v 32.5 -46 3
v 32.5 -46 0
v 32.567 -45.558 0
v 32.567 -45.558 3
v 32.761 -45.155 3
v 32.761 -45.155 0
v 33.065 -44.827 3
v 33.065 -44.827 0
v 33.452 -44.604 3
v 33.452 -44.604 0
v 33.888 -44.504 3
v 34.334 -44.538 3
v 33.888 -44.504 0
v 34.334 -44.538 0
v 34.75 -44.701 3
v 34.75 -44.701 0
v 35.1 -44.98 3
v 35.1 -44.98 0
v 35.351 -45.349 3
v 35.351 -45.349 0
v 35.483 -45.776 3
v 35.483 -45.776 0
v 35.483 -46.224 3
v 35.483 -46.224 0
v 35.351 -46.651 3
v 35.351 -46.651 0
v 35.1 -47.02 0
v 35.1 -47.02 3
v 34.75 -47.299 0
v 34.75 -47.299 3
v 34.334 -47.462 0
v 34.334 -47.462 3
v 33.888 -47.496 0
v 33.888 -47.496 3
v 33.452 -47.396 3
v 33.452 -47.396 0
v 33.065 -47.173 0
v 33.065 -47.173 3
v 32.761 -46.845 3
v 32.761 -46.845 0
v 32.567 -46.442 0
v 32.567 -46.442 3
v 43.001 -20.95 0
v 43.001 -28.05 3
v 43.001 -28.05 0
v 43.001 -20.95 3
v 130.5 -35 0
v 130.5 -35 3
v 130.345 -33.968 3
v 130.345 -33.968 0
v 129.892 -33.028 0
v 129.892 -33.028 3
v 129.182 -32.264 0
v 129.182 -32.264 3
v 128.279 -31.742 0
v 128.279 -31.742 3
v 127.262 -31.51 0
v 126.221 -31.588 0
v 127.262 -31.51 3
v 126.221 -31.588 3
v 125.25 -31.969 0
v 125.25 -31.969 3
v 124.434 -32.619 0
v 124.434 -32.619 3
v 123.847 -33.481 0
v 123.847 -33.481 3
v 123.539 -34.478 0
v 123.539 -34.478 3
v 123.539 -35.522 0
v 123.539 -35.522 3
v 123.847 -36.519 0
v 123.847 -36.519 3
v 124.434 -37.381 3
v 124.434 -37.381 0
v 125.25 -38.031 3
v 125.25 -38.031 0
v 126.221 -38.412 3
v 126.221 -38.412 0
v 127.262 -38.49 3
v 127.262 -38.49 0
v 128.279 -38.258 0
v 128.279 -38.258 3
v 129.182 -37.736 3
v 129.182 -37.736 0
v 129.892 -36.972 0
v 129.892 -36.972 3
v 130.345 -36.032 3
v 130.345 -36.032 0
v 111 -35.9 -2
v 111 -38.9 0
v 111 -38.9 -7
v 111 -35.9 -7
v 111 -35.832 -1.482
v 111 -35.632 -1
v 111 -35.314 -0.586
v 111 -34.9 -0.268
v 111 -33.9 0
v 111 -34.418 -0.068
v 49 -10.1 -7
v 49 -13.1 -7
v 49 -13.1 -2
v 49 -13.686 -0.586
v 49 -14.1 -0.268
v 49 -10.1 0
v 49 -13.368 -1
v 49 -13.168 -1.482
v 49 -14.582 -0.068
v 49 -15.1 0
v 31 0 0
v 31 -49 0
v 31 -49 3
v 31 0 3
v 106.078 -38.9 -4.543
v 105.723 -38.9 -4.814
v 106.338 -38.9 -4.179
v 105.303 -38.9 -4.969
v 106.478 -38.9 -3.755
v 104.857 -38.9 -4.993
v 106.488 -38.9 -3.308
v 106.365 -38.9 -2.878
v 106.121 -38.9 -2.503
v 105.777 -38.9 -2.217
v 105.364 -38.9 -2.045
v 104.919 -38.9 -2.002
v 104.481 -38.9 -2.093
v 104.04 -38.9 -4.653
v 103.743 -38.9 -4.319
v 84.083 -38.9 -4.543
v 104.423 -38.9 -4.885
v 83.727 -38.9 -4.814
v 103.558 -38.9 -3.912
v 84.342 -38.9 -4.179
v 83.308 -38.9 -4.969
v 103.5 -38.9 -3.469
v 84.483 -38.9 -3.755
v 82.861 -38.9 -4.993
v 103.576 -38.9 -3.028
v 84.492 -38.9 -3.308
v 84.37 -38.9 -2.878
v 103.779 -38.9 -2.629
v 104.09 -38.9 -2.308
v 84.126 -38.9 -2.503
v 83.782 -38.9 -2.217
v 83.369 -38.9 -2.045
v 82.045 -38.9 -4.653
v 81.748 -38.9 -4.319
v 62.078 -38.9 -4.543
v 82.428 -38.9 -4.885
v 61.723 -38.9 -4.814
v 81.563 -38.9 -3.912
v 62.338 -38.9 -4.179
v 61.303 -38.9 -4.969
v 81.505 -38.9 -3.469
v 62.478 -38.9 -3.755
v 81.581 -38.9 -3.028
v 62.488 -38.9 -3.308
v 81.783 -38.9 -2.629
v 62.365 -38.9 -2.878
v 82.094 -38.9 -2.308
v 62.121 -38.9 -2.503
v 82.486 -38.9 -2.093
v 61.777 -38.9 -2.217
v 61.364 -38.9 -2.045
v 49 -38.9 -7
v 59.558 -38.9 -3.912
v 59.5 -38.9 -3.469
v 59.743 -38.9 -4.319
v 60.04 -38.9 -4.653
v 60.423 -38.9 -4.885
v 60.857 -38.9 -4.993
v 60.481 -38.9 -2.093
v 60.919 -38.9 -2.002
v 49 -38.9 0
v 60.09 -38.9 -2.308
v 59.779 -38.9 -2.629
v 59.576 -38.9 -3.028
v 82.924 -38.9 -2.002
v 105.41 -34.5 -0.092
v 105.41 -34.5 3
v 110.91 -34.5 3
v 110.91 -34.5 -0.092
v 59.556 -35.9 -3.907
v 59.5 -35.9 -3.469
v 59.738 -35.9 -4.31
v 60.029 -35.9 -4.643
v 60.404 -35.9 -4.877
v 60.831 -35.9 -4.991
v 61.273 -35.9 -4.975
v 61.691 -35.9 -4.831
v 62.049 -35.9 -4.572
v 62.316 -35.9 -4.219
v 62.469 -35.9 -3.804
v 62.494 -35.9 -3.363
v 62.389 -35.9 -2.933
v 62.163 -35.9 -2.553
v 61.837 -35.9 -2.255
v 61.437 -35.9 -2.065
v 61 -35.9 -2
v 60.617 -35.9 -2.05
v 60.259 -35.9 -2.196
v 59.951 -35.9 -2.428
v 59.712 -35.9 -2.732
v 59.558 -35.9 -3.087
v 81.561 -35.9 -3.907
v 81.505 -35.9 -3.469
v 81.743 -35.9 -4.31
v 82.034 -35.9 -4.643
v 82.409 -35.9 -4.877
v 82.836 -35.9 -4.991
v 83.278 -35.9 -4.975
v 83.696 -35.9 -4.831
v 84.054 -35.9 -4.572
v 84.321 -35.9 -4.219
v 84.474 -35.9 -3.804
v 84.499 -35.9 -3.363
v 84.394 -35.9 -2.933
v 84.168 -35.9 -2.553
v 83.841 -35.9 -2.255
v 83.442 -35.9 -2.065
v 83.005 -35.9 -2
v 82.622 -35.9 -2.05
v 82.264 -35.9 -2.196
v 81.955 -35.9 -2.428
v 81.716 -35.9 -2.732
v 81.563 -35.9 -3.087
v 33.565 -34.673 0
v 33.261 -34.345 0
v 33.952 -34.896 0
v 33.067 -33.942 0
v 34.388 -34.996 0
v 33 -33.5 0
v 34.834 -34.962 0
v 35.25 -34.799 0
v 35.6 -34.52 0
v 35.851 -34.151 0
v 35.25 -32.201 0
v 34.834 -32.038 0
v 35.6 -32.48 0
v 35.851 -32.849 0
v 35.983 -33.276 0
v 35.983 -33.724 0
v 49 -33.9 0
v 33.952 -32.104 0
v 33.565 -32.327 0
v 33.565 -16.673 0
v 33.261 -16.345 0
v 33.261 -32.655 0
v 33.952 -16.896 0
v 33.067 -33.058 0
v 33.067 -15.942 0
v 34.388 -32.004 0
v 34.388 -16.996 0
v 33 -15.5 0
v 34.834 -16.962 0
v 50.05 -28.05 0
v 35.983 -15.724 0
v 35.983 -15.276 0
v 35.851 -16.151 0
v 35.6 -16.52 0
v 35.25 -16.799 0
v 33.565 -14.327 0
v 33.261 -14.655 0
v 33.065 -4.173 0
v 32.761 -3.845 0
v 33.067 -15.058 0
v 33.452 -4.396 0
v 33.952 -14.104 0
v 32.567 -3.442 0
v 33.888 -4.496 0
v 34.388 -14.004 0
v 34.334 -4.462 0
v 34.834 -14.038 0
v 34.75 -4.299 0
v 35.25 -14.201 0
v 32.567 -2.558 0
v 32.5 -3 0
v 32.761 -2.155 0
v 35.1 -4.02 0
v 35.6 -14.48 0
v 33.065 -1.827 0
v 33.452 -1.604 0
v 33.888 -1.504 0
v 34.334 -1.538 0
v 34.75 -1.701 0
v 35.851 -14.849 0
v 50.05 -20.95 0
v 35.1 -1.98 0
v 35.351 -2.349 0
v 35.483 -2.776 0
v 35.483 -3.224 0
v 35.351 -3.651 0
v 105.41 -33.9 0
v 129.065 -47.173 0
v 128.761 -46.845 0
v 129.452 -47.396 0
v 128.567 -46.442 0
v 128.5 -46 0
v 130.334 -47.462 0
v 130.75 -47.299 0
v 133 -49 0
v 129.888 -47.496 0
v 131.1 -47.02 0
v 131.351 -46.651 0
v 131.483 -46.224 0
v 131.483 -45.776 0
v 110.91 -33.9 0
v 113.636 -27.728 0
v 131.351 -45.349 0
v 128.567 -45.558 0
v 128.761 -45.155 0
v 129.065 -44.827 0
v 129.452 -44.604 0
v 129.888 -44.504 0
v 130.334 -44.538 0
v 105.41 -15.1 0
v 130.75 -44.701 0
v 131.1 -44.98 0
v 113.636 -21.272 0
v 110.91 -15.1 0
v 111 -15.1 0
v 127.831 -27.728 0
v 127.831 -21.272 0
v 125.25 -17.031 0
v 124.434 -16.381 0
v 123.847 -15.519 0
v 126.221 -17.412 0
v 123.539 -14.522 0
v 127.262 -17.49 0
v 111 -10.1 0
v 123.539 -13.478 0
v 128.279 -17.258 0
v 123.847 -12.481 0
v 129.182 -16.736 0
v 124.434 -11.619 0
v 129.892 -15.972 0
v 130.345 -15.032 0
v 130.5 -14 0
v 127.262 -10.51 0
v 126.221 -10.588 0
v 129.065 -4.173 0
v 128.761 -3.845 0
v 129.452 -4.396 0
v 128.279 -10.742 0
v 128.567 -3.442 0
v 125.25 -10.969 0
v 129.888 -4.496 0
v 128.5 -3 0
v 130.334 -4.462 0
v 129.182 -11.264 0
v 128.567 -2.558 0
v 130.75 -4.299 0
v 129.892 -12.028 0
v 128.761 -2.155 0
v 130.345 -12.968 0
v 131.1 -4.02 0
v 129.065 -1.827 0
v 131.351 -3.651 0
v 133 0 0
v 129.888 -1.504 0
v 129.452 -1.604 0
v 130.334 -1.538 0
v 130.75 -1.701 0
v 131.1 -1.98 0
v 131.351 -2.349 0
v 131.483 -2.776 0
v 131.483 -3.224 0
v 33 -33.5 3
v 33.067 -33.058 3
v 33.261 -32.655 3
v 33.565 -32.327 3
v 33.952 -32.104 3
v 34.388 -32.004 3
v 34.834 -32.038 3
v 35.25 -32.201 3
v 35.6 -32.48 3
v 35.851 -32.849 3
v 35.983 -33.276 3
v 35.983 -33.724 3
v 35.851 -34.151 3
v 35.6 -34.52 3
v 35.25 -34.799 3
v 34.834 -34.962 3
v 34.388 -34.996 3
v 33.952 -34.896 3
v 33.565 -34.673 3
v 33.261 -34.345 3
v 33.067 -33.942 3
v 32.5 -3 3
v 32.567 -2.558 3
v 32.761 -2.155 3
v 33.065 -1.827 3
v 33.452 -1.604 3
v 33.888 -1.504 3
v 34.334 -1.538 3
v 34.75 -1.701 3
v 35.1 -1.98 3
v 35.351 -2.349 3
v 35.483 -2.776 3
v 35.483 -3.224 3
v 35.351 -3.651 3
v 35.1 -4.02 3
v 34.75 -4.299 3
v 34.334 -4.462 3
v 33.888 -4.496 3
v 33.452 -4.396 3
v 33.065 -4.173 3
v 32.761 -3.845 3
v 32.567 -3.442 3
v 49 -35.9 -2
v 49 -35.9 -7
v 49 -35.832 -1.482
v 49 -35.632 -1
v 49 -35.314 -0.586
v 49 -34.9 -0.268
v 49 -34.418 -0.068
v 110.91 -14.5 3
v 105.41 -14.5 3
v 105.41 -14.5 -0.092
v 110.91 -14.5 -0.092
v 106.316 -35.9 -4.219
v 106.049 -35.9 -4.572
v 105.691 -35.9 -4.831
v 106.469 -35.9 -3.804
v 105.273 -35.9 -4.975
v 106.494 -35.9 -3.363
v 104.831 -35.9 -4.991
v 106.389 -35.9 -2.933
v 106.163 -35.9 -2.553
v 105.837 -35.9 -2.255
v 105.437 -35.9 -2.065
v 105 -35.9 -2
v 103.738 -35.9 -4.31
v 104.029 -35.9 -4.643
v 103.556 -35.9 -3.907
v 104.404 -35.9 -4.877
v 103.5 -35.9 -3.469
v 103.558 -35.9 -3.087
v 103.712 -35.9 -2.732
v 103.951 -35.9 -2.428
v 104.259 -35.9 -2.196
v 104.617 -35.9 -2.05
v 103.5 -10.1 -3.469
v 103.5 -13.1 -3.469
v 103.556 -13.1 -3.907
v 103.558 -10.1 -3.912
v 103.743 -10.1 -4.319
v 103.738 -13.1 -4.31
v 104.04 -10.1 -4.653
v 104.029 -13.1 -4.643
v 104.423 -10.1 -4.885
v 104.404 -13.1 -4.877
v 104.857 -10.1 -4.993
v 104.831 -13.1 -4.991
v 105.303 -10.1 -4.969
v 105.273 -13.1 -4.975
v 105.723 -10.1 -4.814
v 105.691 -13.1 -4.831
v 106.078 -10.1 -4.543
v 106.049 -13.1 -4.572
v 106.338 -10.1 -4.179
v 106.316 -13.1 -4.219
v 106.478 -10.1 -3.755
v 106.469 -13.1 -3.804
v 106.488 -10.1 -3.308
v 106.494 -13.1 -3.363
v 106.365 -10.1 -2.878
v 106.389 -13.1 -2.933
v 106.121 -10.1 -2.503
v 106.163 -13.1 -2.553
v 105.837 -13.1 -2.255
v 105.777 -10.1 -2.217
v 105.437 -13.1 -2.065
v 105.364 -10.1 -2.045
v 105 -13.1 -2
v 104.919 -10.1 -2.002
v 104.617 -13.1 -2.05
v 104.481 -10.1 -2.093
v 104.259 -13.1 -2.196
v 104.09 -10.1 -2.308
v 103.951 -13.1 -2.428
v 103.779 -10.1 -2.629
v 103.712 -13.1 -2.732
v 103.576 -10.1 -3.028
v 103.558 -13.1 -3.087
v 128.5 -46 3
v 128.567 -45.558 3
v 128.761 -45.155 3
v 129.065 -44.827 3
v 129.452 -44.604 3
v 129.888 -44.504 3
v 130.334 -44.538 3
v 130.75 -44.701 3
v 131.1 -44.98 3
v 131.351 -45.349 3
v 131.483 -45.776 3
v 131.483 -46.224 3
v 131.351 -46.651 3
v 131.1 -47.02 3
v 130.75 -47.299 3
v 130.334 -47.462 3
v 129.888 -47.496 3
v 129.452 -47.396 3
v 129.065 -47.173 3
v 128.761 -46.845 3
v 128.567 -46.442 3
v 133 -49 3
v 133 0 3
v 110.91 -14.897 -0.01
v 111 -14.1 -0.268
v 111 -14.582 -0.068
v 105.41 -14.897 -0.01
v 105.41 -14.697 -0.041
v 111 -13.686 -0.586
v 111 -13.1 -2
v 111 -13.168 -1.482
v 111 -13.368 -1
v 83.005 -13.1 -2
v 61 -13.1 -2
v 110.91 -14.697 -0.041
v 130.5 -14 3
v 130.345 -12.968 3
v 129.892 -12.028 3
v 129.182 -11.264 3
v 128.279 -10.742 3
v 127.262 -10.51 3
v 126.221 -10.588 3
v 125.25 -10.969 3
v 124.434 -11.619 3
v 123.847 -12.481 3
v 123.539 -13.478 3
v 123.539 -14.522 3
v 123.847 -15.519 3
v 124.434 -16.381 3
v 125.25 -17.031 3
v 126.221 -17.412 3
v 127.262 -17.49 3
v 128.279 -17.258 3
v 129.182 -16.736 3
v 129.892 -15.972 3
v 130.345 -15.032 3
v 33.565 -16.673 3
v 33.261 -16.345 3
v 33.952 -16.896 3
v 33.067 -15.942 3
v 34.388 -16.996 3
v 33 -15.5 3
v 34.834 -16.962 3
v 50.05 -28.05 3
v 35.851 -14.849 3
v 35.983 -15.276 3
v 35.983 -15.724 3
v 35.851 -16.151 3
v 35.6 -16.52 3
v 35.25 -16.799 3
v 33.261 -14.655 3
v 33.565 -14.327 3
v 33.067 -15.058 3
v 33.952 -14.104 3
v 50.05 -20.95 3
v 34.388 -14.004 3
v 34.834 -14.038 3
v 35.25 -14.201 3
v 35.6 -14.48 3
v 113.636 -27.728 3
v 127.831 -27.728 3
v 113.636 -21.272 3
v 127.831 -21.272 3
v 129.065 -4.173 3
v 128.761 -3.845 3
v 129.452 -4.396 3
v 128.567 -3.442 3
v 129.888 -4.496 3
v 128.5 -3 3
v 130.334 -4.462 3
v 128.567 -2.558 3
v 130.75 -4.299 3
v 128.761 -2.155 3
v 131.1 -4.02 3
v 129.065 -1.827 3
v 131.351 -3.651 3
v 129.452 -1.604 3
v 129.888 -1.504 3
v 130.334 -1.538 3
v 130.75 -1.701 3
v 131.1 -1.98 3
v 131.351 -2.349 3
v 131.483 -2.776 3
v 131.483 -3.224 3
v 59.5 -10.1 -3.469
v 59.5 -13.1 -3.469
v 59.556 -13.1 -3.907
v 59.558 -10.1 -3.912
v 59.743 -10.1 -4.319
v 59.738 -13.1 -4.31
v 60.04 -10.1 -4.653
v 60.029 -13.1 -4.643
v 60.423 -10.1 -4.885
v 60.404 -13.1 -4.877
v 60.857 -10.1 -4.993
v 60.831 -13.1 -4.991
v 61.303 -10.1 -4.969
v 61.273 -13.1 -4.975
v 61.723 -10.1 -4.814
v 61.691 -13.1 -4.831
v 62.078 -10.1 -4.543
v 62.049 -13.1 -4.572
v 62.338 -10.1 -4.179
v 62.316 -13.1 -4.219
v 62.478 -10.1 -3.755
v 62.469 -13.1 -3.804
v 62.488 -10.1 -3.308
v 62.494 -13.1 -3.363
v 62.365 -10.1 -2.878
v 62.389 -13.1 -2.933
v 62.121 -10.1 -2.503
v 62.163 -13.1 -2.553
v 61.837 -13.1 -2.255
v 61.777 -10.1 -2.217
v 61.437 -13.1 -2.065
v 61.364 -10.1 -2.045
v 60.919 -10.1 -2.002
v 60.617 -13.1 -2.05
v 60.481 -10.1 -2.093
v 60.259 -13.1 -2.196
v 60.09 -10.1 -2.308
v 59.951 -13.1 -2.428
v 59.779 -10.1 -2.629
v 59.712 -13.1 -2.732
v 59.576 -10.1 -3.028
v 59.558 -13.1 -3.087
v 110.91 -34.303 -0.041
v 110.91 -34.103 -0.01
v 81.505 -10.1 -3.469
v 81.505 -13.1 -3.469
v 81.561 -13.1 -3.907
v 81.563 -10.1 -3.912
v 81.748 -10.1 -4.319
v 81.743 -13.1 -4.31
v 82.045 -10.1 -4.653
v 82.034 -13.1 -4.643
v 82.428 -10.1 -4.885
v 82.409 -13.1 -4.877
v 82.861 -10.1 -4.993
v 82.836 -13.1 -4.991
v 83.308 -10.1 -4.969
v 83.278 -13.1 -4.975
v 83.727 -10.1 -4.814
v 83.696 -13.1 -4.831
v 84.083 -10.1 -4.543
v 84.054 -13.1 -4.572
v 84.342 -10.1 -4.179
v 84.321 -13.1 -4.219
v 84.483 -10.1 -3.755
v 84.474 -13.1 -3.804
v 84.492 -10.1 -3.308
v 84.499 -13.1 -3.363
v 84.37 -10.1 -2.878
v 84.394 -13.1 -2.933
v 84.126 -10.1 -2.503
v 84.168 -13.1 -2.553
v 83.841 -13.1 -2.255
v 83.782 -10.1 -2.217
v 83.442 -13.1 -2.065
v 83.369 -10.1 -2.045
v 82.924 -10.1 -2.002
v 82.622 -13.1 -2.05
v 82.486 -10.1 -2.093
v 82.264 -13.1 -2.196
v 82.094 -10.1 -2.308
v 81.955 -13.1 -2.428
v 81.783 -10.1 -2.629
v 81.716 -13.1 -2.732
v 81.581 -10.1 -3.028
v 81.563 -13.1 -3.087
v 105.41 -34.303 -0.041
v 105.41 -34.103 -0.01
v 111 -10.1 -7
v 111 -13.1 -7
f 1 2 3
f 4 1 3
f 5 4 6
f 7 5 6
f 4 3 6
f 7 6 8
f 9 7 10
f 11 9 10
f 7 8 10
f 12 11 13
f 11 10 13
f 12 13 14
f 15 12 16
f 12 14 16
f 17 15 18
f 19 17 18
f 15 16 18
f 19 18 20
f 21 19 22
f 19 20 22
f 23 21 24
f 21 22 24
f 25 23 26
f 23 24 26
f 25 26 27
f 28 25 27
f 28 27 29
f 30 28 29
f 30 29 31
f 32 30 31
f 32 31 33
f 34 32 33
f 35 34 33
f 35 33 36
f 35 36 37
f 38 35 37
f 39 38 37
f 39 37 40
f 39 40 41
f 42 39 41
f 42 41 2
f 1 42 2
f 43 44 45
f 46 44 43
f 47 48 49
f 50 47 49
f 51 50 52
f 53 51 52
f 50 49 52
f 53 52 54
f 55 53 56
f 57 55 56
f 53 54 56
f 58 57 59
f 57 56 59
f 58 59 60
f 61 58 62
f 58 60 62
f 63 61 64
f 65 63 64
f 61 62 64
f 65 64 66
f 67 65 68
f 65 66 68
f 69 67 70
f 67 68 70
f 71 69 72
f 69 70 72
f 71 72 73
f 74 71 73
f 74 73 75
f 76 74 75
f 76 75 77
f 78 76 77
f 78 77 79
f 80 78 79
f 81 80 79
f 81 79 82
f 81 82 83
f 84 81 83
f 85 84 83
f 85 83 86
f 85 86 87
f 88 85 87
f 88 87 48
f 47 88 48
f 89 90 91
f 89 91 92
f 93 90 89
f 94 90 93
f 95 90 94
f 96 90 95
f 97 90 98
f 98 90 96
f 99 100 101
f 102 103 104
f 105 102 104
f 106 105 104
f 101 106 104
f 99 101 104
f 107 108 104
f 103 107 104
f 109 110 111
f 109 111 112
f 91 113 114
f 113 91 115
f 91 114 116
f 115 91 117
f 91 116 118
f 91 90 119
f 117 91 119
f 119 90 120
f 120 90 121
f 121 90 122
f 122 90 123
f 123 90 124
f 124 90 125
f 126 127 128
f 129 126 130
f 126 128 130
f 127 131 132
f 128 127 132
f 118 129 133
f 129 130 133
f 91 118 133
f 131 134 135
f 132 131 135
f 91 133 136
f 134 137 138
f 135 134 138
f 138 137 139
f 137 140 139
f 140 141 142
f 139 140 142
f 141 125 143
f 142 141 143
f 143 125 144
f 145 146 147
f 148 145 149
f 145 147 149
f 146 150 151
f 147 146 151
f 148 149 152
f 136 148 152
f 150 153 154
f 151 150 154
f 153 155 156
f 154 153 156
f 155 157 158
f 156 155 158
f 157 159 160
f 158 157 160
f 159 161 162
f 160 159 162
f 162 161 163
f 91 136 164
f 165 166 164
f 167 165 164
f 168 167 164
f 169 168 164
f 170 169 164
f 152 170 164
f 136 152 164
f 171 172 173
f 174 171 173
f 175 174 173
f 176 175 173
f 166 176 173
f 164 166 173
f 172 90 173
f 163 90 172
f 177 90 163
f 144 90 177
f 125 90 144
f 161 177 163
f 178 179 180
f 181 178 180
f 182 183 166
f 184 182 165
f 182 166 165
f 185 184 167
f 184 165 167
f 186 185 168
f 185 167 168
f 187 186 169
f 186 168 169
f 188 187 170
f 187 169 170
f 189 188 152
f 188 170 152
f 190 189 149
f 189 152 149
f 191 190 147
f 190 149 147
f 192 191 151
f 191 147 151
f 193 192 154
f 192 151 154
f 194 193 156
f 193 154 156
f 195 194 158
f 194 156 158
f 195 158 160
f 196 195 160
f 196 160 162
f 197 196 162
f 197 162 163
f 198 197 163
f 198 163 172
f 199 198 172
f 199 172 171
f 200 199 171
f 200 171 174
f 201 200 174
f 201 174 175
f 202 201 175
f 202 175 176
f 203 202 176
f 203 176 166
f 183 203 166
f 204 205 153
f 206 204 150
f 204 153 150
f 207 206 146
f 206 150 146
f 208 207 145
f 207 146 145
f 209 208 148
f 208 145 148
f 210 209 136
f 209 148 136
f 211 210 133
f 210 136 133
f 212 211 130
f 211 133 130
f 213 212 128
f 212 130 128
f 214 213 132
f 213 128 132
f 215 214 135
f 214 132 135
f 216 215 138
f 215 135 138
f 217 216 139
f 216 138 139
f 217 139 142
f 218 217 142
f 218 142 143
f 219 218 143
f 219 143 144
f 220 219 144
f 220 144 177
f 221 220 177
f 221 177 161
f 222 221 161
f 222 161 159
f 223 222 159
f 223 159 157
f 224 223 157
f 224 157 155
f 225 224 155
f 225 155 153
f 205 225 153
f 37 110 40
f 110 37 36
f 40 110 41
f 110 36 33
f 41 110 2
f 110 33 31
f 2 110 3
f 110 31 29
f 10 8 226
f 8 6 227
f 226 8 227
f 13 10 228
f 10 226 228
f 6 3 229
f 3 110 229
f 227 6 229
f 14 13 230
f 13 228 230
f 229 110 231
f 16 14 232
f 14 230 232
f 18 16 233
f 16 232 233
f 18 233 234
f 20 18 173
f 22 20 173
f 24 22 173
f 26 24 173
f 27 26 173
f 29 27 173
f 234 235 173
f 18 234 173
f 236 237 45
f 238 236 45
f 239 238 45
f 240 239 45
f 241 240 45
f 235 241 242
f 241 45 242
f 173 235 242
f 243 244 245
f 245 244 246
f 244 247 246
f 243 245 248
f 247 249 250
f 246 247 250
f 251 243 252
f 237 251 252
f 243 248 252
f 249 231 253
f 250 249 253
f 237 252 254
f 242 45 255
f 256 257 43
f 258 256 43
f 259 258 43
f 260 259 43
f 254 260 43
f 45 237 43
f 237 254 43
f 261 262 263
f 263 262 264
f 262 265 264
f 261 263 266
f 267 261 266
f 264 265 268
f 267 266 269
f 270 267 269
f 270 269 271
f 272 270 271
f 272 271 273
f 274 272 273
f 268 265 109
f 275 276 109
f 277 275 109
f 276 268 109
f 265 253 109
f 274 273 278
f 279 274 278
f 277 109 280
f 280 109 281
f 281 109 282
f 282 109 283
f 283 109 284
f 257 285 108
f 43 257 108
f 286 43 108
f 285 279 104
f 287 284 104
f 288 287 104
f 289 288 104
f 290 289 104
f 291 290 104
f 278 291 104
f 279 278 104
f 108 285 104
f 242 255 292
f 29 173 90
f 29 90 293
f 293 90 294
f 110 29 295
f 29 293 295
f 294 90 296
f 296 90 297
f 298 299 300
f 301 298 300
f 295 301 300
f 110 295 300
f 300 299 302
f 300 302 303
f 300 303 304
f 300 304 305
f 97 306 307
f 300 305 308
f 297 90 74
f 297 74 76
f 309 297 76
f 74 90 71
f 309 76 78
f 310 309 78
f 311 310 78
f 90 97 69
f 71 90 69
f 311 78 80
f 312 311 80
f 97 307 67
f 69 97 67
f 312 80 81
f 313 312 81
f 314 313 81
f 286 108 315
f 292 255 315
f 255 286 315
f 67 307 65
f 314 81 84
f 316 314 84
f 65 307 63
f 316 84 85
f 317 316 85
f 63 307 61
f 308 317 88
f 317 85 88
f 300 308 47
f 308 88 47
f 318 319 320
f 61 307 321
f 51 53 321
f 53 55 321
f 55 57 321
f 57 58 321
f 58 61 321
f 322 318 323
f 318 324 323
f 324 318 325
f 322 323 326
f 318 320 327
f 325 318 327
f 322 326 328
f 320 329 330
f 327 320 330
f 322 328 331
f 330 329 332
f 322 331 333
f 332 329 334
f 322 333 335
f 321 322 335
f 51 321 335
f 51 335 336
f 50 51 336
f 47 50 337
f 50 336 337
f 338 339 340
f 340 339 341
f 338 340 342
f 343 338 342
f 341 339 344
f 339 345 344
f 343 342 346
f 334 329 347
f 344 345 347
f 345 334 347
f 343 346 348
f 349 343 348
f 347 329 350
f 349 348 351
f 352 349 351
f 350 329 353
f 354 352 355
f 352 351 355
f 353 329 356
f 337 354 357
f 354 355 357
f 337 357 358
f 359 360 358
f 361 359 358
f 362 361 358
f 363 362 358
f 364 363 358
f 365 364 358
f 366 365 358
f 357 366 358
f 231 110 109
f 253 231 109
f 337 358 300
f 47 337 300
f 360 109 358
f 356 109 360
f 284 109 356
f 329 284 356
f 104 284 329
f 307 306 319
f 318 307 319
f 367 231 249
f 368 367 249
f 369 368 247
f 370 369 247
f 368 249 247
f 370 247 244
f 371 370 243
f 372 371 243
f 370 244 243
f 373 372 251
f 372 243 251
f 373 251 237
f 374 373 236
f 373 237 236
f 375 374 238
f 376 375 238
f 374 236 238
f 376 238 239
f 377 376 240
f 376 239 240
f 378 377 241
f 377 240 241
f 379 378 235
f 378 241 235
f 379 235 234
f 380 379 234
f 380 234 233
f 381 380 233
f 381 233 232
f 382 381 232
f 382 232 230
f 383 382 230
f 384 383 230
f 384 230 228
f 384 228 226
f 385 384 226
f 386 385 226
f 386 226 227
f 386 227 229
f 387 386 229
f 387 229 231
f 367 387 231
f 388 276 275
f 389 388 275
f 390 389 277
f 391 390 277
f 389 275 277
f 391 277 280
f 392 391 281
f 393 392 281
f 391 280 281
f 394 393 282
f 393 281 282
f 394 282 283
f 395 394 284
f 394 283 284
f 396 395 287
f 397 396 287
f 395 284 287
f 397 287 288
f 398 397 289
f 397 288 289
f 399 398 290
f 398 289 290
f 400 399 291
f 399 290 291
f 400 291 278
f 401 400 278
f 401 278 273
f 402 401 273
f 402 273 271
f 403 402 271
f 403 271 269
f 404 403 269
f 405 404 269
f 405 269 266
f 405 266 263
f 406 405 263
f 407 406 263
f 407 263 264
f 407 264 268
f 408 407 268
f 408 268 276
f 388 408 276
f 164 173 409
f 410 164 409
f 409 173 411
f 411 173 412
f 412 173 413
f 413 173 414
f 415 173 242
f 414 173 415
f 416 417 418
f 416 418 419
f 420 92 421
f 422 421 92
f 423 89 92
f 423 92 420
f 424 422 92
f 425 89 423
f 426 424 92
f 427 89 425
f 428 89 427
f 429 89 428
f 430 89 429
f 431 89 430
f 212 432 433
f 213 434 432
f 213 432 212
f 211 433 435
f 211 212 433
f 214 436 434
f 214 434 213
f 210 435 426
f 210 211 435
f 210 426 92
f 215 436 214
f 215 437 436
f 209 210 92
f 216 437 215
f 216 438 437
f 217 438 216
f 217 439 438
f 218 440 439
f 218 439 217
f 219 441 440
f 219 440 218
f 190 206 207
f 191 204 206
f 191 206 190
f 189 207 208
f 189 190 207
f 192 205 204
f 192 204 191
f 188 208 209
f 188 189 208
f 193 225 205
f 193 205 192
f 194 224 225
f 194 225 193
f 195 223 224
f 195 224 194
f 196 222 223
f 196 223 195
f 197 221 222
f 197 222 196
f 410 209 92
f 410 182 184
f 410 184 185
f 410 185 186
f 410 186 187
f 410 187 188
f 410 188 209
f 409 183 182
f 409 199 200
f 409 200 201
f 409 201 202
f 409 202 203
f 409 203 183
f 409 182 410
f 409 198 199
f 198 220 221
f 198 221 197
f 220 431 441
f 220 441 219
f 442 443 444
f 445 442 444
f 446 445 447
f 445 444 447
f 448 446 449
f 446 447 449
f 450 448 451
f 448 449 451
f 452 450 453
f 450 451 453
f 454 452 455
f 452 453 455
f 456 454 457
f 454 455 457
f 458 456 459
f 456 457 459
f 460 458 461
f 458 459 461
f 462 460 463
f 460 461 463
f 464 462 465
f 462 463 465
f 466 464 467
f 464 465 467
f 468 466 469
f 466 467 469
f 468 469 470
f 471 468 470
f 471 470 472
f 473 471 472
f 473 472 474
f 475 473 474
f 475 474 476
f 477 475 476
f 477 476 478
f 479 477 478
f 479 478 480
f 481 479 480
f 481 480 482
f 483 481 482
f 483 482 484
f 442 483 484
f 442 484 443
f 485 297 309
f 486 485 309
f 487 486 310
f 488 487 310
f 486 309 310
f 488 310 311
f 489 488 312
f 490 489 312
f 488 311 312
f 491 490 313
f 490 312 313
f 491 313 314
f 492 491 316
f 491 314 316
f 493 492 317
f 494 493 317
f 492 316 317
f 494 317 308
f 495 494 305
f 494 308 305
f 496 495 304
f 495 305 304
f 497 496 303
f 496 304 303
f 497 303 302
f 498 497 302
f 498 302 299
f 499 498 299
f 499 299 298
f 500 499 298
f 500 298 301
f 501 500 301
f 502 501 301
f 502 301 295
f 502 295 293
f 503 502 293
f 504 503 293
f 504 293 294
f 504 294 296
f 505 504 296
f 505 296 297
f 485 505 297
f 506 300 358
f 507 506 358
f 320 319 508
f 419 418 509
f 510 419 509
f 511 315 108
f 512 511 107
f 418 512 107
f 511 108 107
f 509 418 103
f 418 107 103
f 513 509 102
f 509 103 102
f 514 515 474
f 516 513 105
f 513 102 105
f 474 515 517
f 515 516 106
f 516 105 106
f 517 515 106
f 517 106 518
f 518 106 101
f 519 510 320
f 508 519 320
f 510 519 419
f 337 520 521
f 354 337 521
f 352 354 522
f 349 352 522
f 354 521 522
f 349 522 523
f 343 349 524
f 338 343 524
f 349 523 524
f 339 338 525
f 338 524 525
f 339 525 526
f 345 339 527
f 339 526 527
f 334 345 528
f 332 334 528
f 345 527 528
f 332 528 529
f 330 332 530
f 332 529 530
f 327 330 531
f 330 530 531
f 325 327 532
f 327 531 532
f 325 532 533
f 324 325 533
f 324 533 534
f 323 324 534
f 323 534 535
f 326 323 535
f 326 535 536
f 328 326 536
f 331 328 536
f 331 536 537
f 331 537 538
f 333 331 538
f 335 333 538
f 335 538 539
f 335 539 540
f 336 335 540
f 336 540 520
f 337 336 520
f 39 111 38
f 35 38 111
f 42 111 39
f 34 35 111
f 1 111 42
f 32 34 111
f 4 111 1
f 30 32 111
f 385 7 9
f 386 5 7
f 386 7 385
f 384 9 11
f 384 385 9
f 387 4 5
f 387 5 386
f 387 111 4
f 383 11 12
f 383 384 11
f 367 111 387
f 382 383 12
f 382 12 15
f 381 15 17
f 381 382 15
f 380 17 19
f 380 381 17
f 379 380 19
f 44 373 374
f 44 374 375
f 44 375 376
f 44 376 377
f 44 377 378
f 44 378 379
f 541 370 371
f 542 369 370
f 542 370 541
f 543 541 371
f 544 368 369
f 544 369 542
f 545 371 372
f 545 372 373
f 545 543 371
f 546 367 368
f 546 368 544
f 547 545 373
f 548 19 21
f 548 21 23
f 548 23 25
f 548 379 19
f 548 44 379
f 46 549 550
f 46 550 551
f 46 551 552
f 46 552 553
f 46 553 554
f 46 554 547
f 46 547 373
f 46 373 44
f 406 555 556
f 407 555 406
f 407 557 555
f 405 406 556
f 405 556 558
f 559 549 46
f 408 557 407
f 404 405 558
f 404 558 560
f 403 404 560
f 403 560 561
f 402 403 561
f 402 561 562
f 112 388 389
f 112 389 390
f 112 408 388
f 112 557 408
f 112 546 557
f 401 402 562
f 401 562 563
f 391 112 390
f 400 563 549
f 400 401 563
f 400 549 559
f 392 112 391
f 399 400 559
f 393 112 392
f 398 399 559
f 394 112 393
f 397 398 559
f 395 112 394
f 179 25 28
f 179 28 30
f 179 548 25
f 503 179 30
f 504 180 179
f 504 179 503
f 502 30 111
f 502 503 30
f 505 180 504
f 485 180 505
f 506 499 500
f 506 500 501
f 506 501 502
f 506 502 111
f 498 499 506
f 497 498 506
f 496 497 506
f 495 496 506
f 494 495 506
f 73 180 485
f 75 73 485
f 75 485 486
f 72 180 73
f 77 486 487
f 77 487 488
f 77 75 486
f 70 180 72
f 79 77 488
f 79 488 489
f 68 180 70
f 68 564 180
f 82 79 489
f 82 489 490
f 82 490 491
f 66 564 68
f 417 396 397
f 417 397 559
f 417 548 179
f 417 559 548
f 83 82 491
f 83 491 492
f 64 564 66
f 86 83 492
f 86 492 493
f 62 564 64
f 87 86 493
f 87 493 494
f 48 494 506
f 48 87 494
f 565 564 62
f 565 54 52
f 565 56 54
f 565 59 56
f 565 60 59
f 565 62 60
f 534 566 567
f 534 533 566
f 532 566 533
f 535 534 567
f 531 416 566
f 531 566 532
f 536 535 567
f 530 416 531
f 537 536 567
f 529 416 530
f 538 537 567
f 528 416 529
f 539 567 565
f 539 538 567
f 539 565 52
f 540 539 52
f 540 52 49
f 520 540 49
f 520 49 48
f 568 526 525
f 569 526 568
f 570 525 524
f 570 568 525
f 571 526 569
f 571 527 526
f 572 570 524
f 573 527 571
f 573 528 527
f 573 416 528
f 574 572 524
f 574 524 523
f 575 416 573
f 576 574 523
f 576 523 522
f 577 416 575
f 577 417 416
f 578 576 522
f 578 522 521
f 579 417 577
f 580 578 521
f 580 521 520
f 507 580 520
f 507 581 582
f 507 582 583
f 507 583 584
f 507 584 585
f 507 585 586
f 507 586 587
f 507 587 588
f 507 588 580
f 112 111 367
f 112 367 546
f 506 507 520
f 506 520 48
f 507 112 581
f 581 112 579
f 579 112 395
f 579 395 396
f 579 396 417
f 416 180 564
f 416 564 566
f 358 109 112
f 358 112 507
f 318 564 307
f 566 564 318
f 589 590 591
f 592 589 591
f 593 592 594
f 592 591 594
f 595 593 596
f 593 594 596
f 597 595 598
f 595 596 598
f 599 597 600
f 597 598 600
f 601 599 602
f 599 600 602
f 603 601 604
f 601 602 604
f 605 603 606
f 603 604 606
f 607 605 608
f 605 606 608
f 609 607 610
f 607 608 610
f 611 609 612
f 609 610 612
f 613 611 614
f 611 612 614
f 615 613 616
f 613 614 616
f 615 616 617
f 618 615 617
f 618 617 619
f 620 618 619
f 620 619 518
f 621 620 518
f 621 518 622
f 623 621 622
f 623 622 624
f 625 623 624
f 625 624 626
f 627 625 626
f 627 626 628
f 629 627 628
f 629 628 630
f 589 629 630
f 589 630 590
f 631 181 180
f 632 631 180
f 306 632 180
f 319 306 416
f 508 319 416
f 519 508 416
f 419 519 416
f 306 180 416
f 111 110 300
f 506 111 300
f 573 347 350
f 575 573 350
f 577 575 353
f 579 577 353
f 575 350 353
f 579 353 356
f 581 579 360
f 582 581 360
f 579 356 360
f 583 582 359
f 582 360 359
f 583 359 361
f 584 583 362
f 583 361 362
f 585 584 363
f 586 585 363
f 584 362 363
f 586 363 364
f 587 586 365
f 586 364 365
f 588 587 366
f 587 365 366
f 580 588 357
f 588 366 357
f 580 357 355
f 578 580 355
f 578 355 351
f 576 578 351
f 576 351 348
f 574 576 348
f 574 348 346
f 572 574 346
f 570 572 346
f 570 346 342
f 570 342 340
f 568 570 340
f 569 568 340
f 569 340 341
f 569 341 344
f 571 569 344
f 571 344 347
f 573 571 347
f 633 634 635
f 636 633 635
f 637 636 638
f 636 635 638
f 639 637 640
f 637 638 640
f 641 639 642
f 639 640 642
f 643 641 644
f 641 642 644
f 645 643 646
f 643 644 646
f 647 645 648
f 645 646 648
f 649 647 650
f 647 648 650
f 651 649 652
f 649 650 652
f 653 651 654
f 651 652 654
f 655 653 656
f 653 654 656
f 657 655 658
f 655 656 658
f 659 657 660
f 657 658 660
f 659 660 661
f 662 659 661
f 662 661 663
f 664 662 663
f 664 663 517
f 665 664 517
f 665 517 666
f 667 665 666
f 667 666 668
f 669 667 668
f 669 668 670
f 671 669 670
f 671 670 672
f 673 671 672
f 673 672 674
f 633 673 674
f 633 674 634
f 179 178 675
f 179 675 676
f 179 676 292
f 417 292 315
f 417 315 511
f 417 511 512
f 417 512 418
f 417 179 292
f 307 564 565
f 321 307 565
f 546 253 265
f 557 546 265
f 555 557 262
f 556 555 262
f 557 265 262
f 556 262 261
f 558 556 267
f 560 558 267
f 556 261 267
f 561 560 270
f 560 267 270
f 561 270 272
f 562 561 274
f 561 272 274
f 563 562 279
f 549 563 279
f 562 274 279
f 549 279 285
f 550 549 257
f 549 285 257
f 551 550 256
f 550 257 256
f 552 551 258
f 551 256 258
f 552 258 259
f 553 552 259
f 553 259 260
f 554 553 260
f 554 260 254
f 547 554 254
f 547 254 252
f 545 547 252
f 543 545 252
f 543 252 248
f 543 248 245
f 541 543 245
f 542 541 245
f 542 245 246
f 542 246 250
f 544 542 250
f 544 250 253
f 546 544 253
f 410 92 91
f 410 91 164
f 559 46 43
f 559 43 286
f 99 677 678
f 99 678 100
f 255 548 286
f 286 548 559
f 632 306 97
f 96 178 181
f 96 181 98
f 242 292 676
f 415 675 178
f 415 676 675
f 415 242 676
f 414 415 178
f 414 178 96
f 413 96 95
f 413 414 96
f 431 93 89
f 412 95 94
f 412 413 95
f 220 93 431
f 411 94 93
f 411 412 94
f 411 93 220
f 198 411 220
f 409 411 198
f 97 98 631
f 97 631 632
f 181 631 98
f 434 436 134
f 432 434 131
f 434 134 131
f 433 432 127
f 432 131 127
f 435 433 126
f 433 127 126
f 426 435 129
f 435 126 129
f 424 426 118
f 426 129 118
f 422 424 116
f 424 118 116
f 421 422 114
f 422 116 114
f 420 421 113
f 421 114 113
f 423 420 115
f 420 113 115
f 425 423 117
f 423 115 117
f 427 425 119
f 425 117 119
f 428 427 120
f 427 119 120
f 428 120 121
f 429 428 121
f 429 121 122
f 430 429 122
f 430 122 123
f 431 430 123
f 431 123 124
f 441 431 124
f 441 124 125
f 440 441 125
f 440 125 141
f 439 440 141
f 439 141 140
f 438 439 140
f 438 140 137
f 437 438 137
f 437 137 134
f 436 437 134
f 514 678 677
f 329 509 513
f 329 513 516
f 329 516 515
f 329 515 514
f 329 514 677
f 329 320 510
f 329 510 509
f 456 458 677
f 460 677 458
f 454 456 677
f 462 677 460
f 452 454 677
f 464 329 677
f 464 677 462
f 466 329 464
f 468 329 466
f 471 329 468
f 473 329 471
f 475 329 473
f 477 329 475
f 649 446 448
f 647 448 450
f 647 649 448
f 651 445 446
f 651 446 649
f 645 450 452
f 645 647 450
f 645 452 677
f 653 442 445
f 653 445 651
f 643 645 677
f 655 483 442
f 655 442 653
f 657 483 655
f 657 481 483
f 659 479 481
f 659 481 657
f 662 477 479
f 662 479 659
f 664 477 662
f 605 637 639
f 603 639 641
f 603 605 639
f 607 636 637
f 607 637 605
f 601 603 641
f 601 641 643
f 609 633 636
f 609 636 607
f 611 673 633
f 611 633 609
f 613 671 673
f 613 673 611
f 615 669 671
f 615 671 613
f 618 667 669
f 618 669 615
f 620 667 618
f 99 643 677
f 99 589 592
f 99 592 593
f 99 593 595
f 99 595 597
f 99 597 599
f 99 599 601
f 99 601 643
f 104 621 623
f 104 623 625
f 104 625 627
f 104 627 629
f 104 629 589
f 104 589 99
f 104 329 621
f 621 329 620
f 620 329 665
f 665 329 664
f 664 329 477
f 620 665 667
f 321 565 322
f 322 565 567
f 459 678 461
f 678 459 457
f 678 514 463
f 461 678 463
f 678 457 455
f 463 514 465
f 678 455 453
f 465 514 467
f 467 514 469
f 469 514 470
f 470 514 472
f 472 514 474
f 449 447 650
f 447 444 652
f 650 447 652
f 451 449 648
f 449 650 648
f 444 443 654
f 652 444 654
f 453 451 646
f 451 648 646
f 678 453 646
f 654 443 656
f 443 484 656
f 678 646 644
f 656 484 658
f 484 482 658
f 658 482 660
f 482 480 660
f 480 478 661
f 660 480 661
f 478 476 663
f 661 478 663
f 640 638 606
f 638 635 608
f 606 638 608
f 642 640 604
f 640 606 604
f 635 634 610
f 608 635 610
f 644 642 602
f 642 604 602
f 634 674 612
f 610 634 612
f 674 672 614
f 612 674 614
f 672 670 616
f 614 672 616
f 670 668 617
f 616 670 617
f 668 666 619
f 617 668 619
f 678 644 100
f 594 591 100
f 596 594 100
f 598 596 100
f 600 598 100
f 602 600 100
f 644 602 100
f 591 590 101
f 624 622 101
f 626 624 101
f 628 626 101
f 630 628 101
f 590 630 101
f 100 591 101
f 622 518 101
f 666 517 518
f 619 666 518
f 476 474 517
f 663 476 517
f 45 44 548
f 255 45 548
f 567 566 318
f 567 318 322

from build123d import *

# Parameters (mm, degrees)
SKETCH_1_W          = 102
SKETCH_1_H          = 49
EXTRUDE_1_DEPTH     = 3
SKETCH_2_R          = 1.5
CUT_EXTRUDE_1_DEPTH = 4
SKETCH_3_W          = 62
SKETCH_3_H          = 3
EXTRUDE_2_DEPTH     = 7
FILLET_1_R          = 2
FILLET_2_R          = 2
MM_PRESS_1_D        = 3
SKETCH_6_R          = 3.5
SKETCH_6_W          = 5.5
SKETCH_6_H          = 20
SKETCH_6_W_2        = 7.049620939
SKETCH_6_H_2        = 7.099016596
SKETCH_6_W_3        = 14.194500079
SKETCH_6_H_3        = 6.456669412
CUT_EXTRUDE_2_DEPTH = 7


with BuildPart() as part:
    # 草图1 → 凸台-拉伸1 (new body)
    with BuildSketch(Plane.XY):
        with Locations((82, -24.5)):
            Rectangle(SKETCH_1_W, SKETCH_1_H)
    extrude(amount=EXTRUDE_1_DEPTH)

    # 草图2 → 切除-拉伸1 (cut, through all)
    with BuildSketch(Plane(origin=(0, 0, 0), x_dir=(-1, 0, 0), z_dir=(0, 0, -1))):
        with Locations((-130, -46)):
            Circle(SKETCH_2_R)
        with Locations((-130, -3)):
            Circle(SKETCH_2_R)
        with Locations((-34, -3)):
            Circle(SKETCH_2_R)
        with Locations((-34.5, -15.5)):
            Circle(SKETCH_2_R)
        with Locations((-34, -46)):
            Circle(SKETCH_2_R)
        with Locations((-34.5, -33.5)):
            Circle(SKETCH_2_R)
    extrude(amount=-CUT_EXTRUDE_1_DEPTH, mode=Mode.SUBTRACT)

    # 草图3 → 凸台-拉伸2 (add)
    with BuildSketch(Plane(origin=(0, 0, 0), x_dir=(-1, 0, 0), z_dir=(0, 0, -1))):
        with Locations((-80, -11.6)):
            Rectangle(SKETCH_3_W, SKETCH_3_H)
        with Locations((-80, -37.4)):
            Rectangle(SKETCH_3_W, SKETCH_3_H)
    extrude(amount=EXTRUDE_2_DEPTH)

    # 圆角1
    fillet_1_edges = [part.edges().sort_by_distance(p)[0] for p in [
        (80, -13.1, 0),
    ]]
    fillet(fillet_1_edges, radius=FILLET_1_R)

    # 圆角2
    fillet_2_edges = [part.edges().sort_by_distance(p)[0] for p in [
        (80, -35.9, 0),
    ]]
    fillet(fillet_2_edges, radius=FILLET_2_R)

    # 大小mm Press 暗销孔1 (through all)
    with Locations(Plane(origin=(43.000752307, -10.1, 120.302802184), x_dir=(0.99978014, 0, -0.020968354), z_dir=(0, 1, 0))):
        with Locations((20.591231353, 123.39816829), (42.591231353, 122.936763059), (64.581557509, 122.475560716)):
            Hole(MM_PRESS_1_D / 2)

    # 草图6 → 切除-拉伸2 (cut)
    with BuildSketch(Plane.XY.offset(3)):
        with Locations((127, -14)):
            Circle(SKETCH_6_R)
        with Locations((127, -35)):
            Circle(SKETCH_6_R)
        with Locations((108.159552583, -24.5)):
            Rectangle(SKETCH_6_W, SKETCH_6_H)
        with Locations((46.525562777, -24.5)):
            Rectangle(SKETCH_6_W_2, SKETCH_6_H_2)
        with Locations((120.733739183, -24.5)):
            Rectangle(SKETCH_6_W_3, SKETCH_6_H_3)
    extrude(amount=-CUT_EXTRUDE_2_DEPTH, mode=Mode.SUBTRACT)


solid = part.part
